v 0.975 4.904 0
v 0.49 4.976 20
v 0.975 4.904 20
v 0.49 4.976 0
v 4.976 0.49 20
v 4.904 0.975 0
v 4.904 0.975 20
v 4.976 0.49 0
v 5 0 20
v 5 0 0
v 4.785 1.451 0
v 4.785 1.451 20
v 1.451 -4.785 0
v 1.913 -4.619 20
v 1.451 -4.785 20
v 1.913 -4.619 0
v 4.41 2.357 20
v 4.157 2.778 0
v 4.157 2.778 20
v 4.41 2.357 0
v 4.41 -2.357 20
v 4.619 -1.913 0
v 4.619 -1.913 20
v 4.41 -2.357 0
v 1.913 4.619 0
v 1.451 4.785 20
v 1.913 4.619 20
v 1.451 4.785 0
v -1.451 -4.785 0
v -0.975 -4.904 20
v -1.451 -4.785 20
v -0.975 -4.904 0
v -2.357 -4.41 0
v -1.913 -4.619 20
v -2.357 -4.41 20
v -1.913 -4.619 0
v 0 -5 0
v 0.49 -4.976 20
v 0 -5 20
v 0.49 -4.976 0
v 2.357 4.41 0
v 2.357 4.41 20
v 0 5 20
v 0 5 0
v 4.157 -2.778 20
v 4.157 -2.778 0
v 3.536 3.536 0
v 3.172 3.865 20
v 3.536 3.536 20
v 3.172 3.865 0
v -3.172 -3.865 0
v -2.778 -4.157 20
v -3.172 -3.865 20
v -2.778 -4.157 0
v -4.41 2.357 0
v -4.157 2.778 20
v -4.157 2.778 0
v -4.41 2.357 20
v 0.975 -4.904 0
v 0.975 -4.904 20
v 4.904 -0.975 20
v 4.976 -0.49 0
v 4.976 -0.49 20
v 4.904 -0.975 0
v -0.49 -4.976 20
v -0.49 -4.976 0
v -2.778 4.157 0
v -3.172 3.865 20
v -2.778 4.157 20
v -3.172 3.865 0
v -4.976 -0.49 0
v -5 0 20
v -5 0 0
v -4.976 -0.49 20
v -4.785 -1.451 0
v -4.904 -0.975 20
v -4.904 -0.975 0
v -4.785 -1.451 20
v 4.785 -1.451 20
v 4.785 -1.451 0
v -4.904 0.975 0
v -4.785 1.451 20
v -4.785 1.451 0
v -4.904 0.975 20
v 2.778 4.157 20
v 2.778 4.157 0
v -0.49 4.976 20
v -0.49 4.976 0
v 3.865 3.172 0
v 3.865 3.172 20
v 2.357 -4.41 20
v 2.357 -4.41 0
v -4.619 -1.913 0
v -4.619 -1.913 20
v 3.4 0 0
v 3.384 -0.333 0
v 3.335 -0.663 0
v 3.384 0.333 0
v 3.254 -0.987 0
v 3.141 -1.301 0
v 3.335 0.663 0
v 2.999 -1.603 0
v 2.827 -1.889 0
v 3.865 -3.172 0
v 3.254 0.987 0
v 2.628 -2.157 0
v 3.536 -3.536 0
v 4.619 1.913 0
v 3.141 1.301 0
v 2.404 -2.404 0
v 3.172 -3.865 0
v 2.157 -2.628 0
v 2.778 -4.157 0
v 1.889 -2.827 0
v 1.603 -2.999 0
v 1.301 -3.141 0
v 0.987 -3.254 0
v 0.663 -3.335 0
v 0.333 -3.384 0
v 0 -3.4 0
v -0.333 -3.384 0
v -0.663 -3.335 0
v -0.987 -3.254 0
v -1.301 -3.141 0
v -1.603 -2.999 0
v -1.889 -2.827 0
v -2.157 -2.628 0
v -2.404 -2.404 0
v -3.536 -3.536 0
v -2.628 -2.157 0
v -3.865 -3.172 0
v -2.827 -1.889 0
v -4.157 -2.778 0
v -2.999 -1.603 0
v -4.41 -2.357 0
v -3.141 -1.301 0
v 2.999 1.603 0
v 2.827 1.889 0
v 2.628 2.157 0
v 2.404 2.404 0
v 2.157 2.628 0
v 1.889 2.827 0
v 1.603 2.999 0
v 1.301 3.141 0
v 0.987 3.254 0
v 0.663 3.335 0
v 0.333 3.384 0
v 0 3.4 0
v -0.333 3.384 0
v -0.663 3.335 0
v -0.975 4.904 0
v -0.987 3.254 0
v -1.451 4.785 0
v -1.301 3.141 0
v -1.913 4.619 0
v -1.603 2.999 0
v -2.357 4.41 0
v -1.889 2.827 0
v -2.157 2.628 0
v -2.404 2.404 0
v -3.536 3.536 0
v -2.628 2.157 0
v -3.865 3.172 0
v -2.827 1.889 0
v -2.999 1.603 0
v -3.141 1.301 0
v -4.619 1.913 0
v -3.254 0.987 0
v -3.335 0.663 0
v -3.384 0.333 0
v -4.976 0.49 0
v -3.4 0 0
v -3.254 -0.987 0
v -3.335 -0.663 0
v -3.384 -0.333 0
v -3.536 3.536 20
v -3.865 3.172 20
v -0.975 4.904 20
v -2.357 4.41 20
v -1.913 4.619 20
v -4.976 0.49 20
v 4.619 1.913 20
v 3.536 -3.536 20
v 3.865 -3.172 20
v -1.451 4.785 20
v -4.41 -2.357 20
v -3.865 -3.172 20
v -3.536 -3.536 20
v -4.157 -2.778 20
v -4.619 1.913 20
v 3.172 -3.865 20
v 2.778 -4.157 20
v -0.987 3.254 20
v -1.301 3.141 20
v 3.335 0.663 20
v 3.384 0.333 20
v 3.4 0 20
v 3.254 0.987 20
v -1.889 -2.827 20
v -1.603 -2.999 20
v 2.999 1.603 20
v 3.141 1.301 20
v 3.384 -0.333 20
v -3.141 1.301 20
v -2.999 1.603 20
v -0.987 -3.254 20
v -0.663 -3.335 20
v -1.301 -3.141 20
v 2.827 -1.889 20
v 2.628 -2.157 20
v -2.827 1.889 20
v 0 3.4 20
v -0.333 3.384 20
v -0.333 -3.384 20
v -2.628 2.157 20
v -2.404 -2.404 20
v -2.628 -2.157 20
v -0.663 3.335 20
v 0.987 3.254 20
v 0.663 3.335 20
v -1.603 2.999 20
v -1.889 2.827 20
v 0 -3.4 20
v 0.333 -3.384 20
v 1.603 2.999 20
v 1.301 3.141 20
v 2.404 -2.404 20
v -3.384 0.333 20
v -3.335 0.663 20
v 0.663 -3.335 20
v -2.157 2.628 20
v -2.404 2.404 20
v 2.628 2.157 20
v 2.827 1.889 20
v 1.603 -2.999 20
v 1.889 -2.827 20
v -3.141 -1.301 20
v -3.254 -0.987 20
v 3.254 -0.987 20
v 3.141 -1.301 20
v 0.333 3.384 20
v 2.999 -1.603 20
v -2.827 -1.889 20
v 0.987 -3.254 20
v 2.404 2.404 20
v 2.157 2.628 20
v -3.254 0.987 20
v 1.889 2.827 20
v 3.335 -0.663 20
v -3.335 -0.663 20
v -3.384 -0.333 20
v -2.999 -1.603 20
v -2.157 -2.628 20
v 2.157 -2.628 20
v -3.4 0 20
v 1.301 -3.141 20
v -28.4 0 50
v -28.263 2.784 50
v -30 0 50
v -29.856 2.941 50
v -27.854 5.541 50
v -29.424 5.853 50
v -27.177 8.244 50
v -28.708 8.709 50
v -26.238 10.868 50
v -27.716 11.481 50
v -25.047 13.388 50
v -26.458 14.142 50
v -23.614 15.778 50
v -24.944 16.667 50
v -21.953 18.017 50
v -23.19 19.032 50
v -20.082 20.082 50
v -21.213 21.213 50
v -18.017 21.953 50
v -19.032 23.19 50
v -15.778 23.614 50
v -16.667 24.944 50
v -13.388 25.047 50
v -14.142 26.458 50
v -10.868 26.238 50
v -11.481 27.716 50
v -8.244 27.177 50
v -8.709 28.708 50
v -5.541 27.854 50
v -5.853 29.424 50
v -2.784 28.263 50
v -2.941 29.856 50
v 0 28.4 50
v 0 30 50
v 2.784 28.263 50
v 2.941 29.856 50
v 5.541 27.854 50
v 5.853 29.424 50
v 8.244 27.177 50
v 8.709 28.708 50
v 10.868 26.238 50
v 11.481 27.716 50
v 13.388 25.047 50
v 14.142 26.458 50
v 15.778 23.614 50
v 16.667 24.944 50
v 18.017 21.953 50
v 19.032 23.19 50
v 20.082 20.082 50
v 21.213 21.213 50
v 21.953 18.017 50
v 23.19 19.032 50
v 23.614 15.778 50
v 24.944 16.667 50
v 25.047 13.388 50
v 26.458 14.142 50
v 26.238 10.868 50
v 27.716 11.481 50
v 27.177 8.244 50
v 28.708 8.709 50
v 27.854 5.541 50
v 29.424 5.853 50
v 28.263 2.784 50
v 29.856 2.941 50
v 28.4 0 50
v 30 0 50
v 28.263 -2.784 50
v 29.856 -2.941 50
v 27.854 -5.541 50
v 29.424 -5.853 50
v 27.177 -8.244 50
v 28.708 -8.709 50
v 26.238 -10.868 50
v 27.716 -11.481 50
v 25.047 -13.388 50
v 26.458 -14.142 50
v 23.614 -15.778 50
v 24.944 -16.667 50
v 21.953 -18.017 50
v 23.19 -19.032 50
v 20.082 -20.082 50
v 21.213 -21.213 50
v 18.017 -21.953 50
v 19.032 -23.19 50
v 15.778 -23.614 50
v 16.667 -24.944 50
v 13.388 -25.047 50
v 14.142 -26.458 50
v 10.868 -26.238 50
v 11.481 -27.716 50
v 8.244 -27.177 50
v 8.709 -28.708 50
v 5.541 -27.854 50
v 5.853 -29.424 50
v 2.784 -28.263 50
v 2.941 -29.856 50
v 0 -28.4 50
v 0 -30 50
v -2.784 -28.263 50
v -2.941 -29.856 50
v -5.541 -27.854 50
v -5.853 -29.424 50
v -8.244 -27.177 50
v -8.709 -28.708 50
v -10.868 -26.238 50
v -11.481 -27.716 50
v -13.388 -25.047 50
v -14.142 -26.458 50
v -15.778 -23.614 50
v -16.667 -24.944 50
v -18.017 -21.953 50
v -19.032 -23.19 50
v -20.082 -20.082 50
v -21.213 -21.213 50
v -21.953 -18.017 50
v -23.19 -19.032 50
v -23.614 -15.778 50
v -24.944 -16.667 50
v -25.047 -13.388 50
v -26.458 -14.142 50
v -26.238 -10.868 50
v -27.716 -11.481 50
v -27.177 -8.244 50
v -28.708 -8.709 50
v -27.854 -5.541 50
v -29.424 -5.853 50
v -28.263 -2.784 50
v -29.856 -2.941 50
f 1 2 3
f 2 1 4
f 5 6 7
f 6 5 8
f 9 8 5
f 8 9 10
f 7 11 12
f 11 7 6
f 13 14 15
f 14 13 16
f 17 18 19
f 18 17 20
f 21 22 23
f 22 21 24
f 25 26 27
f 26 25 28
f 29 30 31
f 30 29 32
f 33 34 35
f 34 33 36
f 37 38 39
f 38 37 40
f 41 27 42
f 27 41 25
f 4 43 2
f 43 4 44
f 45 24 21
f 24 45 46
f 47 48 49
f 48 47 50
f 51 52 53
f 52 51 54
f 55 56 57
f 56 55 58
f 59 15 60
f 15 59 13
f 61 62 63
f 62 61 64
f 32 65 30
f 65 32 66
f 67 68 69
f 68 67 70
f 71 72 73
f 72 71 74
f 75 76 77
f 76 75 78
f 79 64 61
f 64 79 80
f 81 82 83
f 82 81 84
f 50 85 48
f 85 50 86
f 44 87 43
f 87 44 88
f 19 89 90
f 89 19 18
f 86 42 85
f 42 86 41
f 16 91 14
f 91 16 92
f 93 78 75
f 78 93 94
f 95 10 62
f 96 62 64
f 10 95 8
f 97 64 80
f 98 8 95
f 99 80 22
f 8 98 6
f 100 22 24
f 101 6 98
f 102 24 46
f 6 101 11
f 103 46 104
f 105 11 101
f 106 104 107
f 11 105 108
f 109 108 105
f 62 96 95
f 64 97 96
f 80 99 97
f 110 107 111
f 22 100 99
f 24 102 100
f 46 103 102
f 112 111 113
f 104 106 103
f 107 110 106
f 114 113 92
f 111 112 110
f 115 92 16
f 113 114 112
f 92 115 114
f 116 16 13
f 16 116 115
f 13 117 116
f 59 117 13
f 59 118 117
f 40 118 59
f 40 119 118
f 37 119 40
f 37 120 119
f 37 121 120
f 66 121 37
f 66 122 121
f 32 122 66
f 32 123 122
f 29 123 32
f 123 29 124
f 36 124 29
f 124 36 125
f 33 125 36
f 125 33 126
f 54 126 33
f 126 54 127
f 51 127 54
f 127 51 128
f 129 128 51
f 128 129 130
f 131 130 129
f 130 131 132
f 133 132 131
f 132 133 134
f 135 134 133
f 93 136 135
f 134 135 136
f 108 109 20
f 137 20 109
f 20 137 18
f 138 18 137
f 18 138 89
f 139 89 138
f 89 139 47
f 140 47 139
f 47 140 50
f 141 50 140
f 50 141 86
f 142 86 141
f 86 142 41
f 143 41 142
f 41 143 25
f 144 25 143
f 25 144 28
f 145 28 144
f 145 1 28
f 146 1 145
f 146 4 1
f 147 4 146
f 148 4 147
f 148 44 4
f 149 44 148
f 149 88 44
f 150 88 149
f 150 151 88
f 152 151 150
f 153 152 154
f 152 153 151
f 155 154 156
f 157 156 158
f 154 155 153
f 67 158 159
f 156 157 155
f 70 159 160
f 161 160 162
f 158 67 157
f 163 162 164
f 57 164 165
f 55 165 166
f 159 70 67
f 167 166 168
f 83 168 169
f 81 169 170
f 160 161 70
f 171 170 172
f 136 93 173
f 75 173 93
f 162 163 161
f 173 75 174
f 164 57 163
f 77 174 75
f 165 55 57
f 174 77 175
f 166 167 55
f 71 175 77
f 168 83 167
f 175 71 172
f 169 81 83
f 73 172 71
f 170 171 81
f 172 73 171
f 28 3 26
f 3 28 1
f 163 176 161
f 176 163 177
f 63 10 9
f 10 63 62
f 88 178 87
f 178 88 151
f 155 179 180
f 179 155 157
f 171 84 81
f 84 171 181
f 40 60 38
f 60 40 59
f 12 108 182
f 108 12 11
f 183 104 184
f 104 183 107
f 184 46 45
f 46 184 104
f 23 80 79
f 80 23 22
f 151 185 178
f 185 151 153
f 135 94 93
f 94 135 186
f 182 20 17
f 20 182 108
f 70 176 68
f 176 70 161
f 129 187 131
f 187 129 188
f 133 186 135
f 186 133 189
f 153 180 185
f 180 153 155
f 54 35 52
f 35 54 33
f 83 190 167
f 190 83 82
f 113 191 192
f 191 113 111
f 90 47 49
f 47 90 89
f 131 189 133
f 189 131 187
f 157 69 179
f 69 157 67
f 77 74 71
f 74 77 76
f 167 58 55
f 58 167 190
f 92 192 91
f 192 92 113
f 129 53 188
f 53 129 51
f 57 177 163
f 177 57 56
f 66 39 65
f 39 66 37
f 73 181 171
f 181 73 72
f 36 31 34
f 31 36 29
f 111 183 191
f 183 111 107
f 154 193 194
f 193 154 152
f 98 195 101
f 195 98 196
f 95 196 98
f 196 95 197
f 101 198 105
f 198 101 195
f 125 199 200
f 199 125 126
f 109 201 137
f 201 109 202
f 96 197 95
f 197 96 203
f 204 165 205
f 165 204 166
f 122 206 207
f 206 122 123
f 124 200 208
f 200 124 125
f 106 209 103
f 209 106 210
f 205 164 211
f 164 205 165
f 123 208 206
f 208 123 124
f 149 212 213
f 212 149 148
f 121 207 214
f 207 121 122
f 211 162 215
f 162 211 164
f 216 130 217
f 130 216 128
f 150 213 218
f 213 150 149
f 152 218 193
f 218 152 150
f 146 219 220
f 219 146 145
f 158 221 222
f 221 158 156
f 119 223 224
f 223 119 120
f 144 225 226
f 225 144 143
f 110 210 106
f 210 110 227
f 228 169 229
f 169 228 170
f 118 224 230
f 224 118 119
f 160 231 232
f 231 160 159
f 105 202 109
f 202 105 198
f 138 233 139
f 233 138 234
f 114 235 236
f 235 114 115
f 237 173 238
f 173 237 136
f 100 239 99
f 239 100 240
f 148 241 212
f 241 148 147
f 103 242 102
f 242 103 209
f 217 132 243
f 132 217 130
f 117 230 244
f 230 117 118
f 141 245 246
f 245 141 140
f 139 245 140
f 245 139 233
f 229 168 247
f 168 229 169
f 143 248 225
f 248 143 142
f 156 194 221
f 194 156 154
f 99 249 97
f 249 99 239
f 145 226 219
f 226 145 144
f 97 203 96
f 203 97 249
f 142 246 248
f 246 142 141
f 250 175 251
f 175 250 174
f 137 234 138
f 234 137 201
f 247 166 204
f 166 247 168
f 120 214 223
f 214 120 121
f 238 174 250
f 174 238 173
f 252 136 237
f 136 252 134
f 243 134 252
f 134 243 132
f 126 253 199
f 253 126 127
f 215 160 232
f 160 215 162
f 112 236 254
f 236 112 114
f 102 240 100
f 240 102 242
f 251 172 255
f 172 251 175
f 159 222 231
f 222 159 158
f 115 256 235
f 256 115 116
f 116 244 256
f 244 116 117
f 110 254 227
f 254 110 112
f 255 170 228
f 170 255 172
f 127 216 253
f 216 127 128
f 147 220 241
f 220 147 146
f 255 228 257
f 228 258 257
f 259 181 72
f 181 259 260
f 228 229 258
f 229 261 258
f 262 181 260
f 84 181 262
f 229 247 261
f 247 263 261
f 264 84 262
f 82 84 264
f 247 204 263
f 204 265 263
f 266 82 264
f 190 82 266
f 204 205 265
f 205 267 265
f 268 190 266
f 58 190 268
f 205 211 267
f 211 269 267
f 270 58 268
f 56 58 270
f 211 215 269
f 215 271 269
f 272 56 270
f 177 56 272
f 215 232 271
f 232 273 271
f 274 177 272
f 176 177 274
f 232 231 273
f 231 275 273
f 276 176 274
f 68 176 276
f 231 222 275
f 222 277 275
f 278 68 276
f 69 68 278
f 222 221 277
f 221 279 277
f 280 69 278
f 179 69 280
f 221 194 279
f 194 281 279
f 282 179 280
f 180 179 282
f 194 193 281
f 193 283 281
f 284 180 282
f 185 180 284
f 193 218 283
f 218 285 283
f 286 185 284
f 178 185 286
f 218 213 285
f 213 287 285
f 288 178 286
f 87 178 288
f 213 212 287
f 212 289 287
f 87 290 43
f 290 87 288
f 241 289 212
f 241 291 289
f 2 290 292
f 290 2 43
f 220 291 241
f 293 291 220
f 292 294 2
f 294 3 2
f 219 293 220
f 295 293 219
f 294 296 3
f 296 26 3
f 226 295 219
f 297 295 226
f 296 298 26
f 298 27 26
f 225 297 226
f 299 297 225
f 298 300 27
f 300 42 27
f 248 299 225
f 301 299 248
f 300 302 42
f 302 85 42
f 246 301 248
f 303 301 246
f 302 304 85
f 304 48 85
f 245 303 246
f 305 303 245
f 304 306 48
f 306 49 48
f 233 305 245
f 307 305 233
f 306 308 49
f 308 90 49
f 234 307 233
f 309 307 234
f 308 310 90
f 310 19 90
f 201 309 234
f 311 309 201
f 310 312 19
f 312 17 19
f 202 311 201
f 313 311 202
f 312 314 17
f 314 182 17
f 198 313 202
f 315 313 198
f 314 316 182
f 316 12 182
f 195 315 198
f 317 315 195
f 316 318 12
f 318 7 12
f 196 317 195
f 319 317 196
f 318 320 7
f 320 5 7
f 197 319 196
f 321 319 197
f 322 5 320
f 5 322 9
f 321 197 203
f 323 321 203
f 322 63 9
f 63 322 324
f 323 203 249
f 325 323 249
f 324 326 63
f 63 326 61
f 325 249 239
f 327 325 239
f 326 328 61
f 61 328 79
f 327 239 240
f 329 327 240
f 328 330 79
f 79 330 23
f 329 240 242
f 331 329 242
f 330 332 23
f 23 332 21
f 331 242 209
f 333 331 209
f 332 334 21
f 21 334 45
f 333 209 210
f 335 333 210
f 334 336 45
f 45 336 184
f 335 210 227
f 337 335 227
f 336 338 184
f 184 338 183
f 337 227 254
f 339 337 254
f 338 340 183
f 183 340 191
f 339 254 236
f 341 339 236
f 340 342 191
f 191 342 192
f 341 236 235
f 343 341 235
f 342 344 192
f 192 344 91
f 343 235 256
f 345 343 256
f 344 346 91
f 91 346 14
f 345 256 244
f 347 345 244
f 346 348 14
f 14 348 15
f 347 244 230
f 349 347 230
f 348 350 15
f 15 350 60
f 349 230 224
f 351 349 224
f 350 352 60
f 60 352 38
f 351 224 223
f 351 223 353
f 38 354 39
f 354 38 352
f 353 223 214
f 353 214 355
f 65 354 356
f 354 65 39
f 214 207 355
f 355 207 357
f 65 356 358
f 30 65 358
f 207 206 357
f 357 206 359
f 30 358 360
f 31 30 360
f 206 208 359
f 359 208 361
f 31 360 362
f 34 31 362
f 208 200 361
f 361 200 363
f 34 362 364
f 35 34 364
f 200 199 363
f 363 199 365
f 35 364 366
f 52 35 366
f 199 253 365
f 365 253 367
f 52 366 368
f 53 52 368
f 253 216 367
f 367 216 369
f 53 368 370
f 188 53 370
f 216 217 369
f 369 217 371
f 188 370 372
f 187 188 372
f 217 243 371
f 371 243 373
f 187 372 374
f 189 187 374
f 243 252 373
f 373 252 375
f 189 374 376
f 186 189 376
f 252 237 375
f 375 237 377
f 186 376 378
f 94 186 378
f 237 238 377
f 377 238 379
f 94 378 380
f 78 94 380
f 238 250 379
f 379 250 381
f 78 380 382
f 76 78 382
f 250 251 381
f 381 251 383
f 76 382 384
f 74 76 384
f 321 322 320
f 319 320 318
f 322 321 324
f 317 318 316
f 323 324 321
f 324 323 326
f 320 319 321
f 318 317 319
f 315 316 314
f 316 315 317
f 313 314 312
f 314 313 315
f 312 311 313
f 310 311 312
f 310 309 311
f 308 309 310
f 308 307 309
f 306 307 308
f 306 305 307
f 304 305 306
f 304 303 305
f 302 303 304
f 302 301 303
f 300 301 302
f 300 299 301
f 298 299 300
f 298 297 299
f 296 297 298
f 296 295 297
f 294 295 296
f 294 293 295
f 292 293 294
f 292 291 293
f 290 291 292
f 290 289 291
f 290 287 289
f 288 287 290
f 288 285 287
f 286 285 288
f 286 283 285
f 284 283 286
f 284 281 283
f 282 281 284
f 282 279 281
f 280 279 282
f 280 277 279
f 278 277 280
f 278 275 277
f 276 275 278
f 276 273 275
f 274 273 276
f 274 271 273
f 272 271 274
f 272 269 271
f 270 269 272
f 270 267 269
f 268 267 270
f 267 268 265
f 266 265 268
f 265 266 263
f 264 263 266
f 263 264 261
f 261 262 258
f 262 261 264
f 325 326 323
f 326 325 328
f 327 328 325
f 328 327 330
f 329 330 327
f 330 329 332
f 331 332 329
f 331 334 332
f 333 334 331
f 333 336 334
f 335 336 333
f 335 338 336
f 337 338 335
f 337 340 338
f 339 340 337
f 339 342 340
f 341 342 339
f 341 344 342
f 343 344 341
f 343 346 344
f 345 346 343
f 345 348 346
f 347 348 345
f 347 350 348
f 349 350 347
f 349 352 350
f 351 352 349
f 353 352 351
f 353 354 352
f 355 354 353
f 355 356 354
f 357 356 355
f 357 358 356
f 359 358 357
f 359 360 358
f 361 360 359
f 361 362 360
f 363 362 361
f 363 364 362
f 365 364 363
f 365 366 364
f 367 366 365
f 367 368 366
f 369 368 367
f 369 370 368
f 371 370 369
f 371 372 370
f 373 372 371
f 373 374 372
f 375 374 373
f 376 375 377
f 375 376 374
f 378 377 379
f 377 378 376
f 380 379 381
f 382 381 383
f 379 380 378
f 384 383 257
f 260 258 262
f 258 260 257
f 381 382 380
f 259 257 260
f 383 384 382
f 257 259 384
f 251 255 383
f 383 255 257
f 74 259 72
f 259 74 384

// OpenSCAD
// Lab Funnel Design
// Units: millimetres
// Orientation: Upright, wide opening at top, rests on XY plane at z=0.

// --- Dimensions ---
// Spout (Tube)
$spout_outer_diameter = 10;
$spout_inner_diameter = 6.8; // 10 - 2*1.6
$spout_length = 20;

// Cone (Funnel)
$cone_bottom_diameter = 10; // Matches spout outer diameter
$cone_top_diameter = 60;
$cone_height = 30; // From z=20 to z=50

// Wall Thickness
$wall_thickness = 1.6;

// Resolution for curved surfaces
$fn = 64;

// --- Helper Functions ---

// Function to create a hollow cylinder (tube)
// Arguments: outer_d, inner_d, height, position (x,y,z)
module hollow_cylinder(outer_d, inner_d, height, pos = [0,0,0]) {
    translate(pos) {
        difference() {
            cylinder(h = height, d = outer_d, $fn = $fn);
            cylinder(h = height, d = inner_d, $fn = $fn);
        }
    }
}

// Function to create a hollow cone using rotate_extrude
// Arguments: bottom_d, top_d, height, position (x,y,z)
// bottom_d is at z=pos[2], top_d is at z=pos[2]+height
module hollow_cone(bottom_d, top_d, height, pos = [0,0,0]) {
    translate(pos) {
        // Calculate radii for the profile
        r_bottom = bottom_d / 2;
        r_top = top_d / 2;
        
        // Calculate inner radii for the hole
        r_inner_bottom = bottom_d / 2 - $wall_thickness;
        r_inner_top = top_d / 2 - $wall_thickness;
        
        // We will extrude a profile in the XZ plane (rotated 90 deg around Y)
        // The profile consists of two lines:
        // 1. Outer wall: from (r_bottom, 0) to (r_top, height)
        // 2. Inner wall: from (r_inner_bottom, 0) to (r_inner_top, height)
        // We use a polygon to define the area between these lines.
        
        // Points for the profile polygon [x, z]
        // Start at bottom outer edge, go to top outer edge, then back to top inner edge, then bottom inner edge.
        // Note: rotate_extrude rotates around the Y axis (0,0,0) by default, but we are defining a profile in XZ.
        // Actually, rotate_extrude rotates around the Y axis. If we define points in XZ, we need to be careful.
        // Standard rotate_extrude takes a 2D profile in the XZ plane (if we consider Y as the axis of rotation? No).
        // rotate_extrude rotates around the Y axis. The profile must be in the XZ plane? 
        // No, rotate_extrude rotates the 2D profile around the Y axis. The profile is defined in the XZ plane? 
        // Wait, rotate_extrude rotates around the Y axis. The profile is usually defined in the XZ plane? 
        // Let's re-verify: rotate_extrude rotates around the Y axis. The profile is in the XZ plane? 
        // Actually, the profile is in the XZ plane relative to the rotation axis Y. 
        // So points are [x, z].
        
        // Let's construct the profile polygon for the wall thickness.
        // We need to close the loop.
        // Path: Bottom Outer -> Top Outer -> Top Inner -> Bottom Inner -> Bottom Outer
        
        profile_points = [
            [r_bottom, 0],           // Bottom Outer Edge
            [r_top, height],         // Top Outer Edge
            [r_inner_top, height],   // Top Inner Edge
            [r_inner_bottom, 0]      // Bottom Inner Edge
        ];
        
        // Add the closing segment from Bottom Inner to Bottom Outer to close the polygon
        // The list above is not closed. We need to explicitly close it or rely on the last point connecting to the first.
        // OpenSCAD polygon requires a closed loop.
        profile_points = [
            [r_bottom, 0],
            [r_top, height],
            [r_inner_top, height],
            [r_inner_bottom, 0],
            [r_bottom, 0] // Close the loop
        ];
        
        rotate_extrude(angle = 360, $fn = $fn) {
            polygon(points = profile_points);
        }
    }
}

// --- Main Assembly ---

// 1. Build the Spout (Tube)
// Position: z=0 to z=20
hollow_cylinder(
    outer_d = $spout_outer_diameter,
    inner_d = $spout_inner_diameter,
    height = $spout_length,
    pos = [0, 0, 0]
);

// 2. Build the Cone (Funnel)
// Position: z=20 to z=50
hollow_cone(
    bottom_d = $cone_bottom_diameter,
    top_d = $cone_top_diameter,
    height = $cone_height,
    pos = [0, 0, 20]
);
